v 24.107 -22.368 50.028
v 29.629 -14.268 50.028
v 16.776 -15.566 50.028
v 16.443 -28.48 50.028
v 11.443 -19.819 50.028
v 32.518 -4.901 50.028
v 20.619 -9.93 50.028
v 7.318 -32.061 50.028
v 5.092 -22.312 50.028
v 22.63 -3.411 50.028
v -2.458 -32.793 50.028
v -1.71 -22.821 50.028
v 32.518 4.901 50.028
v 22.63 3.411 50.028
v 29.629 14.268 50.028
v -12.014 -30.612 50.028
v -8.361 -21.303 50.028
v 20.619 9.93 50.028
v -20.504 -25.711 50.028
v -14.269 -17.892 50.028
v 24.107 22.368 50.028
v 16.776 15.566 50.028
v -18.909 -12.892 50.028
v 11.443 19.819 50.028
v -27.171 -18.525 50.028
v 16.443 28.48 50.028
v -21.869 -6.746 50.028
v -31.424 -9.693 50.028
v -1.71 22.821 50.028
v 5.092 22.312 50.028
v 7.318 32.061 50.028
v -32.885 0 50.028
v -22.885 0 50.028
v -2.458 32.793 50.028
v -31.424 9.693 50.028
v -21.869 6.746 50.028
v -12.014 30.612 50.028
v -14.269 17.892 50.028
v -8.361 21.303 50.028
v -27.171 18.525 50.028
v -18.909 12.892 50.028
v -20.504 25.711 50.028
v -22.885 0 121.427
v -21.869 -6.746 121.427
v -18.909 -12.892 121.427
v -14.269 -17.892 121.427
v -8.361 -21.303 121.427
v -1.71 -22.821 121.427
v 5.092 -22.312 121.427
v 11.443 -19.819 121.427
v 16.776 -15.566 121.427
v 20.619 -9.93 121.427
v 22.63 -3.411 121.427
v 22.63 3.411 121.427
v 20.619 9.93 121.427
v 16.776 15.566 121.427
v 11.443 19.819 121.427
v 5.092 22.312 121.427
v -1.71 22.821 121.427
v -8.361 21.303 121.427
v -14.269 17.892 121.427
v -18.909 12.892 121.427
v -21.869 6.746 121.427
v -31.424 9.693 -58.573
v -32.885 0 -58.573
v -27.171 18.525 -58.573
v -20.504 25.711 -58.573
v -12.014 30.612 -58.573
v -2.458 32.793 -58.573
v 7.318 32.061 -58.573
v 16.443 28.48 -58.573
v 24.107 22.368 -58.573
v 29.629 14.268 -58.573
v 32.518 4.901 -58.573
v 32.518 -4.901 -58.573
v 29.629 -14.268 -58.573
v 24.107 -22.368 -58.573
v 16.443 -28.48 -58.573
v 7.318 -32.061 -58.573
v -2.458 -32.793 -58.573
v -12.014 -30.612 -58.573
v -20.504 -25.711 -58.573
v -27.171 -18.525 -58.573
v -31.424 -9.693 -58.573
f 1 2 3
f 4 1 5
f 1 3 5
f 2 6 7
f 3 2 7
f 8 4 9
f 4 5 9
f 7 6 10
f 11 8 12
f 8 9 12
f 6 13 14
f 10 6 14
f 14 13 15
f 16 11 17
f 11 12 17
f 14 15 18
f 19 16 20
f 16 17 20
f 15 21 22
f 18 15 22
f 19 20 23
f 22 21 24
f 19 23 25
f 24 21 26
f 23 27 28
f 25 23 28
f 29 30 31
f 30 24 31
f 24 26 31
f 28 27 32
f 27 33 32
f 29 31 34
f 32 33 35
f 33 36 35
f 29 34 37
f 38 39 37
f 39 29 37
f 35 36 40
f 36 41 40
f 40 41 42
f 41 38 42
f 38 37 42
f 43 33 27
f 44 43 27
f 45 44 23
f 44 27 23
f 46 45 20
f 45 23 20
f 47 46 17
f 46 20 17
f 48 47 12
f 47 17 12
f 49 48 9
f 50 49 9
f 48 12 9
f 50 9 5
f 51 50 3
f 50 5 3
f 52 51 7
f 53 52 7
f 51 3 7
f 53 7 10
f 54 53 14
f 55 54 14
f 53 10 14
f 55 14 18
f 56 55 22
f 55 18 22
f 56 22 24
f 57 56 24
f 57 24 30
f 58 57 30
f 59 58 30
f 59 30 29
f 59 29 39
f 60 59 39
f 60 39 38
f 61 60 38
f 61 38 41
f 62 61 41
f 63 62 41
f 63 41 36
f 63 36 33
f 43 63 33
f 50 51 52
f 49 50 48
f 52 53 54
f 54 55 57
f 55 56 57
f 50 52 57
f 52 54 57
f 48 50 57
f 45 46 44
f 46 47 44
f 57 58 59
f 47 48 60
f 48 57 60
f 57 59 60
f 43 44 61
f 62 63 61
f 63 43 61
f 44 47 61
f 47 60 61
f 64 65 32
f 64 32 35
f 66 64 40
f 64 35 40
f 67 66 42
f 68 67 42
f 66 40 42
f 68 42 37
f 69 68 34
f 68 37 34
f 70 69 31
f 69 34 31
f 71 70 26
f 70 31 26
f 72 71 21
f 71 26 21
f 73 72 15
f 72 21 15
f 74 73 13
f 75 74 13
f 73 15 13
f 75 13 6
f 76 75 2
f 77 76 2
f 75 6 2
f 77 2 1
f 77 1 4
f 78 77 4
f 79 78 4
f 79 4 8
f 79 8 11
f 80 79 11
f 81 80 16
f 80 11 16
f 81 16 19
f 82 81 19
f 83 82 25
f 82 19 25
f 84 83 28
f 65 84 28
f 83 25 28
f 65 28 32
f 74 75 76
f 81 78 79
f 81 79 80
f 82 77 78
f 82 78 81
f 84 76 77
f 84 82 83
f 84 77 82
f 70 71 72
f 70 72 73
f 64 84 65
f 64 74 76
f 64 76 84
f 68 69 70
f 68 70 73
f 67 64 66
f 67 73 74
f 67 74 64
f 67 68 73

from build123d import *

# Parameters (mm, degrees)
F0_W     = 32.885318622
F0_H     = 108.601231128
F2_T     = -10
F3_DEPTH = 170


with BuildPart() as f1:
    # F0 (on Front) → F1 (revolve)
    with BuildSketch(Plane.XZ):
        with Locations((-16.4426611736, -4.2723771185)):
            Rectangle(F0_W, F0_H)
    revolve(axis=Axis((-1.8626e-06, 0, -4.2723771185), (0, 0, -1)))

    # F2
    f2_openings = [f1.faces().sort_by_distance(p)[0] for p in [
        (-2e-06, 0, 50.028238),
    ]]
    offset(amount=F2_T, openings=f2_openings)

    # F3 (add): a face of the model
    f3_faces = [f1.faces().sort_by_distance(p)[0] for p in [
        (-1.8626e-06, 0, -48.5729926825),
    ]]
    extrude(f3_faces, amount=F3_DEPTH)


solid = f1.part
